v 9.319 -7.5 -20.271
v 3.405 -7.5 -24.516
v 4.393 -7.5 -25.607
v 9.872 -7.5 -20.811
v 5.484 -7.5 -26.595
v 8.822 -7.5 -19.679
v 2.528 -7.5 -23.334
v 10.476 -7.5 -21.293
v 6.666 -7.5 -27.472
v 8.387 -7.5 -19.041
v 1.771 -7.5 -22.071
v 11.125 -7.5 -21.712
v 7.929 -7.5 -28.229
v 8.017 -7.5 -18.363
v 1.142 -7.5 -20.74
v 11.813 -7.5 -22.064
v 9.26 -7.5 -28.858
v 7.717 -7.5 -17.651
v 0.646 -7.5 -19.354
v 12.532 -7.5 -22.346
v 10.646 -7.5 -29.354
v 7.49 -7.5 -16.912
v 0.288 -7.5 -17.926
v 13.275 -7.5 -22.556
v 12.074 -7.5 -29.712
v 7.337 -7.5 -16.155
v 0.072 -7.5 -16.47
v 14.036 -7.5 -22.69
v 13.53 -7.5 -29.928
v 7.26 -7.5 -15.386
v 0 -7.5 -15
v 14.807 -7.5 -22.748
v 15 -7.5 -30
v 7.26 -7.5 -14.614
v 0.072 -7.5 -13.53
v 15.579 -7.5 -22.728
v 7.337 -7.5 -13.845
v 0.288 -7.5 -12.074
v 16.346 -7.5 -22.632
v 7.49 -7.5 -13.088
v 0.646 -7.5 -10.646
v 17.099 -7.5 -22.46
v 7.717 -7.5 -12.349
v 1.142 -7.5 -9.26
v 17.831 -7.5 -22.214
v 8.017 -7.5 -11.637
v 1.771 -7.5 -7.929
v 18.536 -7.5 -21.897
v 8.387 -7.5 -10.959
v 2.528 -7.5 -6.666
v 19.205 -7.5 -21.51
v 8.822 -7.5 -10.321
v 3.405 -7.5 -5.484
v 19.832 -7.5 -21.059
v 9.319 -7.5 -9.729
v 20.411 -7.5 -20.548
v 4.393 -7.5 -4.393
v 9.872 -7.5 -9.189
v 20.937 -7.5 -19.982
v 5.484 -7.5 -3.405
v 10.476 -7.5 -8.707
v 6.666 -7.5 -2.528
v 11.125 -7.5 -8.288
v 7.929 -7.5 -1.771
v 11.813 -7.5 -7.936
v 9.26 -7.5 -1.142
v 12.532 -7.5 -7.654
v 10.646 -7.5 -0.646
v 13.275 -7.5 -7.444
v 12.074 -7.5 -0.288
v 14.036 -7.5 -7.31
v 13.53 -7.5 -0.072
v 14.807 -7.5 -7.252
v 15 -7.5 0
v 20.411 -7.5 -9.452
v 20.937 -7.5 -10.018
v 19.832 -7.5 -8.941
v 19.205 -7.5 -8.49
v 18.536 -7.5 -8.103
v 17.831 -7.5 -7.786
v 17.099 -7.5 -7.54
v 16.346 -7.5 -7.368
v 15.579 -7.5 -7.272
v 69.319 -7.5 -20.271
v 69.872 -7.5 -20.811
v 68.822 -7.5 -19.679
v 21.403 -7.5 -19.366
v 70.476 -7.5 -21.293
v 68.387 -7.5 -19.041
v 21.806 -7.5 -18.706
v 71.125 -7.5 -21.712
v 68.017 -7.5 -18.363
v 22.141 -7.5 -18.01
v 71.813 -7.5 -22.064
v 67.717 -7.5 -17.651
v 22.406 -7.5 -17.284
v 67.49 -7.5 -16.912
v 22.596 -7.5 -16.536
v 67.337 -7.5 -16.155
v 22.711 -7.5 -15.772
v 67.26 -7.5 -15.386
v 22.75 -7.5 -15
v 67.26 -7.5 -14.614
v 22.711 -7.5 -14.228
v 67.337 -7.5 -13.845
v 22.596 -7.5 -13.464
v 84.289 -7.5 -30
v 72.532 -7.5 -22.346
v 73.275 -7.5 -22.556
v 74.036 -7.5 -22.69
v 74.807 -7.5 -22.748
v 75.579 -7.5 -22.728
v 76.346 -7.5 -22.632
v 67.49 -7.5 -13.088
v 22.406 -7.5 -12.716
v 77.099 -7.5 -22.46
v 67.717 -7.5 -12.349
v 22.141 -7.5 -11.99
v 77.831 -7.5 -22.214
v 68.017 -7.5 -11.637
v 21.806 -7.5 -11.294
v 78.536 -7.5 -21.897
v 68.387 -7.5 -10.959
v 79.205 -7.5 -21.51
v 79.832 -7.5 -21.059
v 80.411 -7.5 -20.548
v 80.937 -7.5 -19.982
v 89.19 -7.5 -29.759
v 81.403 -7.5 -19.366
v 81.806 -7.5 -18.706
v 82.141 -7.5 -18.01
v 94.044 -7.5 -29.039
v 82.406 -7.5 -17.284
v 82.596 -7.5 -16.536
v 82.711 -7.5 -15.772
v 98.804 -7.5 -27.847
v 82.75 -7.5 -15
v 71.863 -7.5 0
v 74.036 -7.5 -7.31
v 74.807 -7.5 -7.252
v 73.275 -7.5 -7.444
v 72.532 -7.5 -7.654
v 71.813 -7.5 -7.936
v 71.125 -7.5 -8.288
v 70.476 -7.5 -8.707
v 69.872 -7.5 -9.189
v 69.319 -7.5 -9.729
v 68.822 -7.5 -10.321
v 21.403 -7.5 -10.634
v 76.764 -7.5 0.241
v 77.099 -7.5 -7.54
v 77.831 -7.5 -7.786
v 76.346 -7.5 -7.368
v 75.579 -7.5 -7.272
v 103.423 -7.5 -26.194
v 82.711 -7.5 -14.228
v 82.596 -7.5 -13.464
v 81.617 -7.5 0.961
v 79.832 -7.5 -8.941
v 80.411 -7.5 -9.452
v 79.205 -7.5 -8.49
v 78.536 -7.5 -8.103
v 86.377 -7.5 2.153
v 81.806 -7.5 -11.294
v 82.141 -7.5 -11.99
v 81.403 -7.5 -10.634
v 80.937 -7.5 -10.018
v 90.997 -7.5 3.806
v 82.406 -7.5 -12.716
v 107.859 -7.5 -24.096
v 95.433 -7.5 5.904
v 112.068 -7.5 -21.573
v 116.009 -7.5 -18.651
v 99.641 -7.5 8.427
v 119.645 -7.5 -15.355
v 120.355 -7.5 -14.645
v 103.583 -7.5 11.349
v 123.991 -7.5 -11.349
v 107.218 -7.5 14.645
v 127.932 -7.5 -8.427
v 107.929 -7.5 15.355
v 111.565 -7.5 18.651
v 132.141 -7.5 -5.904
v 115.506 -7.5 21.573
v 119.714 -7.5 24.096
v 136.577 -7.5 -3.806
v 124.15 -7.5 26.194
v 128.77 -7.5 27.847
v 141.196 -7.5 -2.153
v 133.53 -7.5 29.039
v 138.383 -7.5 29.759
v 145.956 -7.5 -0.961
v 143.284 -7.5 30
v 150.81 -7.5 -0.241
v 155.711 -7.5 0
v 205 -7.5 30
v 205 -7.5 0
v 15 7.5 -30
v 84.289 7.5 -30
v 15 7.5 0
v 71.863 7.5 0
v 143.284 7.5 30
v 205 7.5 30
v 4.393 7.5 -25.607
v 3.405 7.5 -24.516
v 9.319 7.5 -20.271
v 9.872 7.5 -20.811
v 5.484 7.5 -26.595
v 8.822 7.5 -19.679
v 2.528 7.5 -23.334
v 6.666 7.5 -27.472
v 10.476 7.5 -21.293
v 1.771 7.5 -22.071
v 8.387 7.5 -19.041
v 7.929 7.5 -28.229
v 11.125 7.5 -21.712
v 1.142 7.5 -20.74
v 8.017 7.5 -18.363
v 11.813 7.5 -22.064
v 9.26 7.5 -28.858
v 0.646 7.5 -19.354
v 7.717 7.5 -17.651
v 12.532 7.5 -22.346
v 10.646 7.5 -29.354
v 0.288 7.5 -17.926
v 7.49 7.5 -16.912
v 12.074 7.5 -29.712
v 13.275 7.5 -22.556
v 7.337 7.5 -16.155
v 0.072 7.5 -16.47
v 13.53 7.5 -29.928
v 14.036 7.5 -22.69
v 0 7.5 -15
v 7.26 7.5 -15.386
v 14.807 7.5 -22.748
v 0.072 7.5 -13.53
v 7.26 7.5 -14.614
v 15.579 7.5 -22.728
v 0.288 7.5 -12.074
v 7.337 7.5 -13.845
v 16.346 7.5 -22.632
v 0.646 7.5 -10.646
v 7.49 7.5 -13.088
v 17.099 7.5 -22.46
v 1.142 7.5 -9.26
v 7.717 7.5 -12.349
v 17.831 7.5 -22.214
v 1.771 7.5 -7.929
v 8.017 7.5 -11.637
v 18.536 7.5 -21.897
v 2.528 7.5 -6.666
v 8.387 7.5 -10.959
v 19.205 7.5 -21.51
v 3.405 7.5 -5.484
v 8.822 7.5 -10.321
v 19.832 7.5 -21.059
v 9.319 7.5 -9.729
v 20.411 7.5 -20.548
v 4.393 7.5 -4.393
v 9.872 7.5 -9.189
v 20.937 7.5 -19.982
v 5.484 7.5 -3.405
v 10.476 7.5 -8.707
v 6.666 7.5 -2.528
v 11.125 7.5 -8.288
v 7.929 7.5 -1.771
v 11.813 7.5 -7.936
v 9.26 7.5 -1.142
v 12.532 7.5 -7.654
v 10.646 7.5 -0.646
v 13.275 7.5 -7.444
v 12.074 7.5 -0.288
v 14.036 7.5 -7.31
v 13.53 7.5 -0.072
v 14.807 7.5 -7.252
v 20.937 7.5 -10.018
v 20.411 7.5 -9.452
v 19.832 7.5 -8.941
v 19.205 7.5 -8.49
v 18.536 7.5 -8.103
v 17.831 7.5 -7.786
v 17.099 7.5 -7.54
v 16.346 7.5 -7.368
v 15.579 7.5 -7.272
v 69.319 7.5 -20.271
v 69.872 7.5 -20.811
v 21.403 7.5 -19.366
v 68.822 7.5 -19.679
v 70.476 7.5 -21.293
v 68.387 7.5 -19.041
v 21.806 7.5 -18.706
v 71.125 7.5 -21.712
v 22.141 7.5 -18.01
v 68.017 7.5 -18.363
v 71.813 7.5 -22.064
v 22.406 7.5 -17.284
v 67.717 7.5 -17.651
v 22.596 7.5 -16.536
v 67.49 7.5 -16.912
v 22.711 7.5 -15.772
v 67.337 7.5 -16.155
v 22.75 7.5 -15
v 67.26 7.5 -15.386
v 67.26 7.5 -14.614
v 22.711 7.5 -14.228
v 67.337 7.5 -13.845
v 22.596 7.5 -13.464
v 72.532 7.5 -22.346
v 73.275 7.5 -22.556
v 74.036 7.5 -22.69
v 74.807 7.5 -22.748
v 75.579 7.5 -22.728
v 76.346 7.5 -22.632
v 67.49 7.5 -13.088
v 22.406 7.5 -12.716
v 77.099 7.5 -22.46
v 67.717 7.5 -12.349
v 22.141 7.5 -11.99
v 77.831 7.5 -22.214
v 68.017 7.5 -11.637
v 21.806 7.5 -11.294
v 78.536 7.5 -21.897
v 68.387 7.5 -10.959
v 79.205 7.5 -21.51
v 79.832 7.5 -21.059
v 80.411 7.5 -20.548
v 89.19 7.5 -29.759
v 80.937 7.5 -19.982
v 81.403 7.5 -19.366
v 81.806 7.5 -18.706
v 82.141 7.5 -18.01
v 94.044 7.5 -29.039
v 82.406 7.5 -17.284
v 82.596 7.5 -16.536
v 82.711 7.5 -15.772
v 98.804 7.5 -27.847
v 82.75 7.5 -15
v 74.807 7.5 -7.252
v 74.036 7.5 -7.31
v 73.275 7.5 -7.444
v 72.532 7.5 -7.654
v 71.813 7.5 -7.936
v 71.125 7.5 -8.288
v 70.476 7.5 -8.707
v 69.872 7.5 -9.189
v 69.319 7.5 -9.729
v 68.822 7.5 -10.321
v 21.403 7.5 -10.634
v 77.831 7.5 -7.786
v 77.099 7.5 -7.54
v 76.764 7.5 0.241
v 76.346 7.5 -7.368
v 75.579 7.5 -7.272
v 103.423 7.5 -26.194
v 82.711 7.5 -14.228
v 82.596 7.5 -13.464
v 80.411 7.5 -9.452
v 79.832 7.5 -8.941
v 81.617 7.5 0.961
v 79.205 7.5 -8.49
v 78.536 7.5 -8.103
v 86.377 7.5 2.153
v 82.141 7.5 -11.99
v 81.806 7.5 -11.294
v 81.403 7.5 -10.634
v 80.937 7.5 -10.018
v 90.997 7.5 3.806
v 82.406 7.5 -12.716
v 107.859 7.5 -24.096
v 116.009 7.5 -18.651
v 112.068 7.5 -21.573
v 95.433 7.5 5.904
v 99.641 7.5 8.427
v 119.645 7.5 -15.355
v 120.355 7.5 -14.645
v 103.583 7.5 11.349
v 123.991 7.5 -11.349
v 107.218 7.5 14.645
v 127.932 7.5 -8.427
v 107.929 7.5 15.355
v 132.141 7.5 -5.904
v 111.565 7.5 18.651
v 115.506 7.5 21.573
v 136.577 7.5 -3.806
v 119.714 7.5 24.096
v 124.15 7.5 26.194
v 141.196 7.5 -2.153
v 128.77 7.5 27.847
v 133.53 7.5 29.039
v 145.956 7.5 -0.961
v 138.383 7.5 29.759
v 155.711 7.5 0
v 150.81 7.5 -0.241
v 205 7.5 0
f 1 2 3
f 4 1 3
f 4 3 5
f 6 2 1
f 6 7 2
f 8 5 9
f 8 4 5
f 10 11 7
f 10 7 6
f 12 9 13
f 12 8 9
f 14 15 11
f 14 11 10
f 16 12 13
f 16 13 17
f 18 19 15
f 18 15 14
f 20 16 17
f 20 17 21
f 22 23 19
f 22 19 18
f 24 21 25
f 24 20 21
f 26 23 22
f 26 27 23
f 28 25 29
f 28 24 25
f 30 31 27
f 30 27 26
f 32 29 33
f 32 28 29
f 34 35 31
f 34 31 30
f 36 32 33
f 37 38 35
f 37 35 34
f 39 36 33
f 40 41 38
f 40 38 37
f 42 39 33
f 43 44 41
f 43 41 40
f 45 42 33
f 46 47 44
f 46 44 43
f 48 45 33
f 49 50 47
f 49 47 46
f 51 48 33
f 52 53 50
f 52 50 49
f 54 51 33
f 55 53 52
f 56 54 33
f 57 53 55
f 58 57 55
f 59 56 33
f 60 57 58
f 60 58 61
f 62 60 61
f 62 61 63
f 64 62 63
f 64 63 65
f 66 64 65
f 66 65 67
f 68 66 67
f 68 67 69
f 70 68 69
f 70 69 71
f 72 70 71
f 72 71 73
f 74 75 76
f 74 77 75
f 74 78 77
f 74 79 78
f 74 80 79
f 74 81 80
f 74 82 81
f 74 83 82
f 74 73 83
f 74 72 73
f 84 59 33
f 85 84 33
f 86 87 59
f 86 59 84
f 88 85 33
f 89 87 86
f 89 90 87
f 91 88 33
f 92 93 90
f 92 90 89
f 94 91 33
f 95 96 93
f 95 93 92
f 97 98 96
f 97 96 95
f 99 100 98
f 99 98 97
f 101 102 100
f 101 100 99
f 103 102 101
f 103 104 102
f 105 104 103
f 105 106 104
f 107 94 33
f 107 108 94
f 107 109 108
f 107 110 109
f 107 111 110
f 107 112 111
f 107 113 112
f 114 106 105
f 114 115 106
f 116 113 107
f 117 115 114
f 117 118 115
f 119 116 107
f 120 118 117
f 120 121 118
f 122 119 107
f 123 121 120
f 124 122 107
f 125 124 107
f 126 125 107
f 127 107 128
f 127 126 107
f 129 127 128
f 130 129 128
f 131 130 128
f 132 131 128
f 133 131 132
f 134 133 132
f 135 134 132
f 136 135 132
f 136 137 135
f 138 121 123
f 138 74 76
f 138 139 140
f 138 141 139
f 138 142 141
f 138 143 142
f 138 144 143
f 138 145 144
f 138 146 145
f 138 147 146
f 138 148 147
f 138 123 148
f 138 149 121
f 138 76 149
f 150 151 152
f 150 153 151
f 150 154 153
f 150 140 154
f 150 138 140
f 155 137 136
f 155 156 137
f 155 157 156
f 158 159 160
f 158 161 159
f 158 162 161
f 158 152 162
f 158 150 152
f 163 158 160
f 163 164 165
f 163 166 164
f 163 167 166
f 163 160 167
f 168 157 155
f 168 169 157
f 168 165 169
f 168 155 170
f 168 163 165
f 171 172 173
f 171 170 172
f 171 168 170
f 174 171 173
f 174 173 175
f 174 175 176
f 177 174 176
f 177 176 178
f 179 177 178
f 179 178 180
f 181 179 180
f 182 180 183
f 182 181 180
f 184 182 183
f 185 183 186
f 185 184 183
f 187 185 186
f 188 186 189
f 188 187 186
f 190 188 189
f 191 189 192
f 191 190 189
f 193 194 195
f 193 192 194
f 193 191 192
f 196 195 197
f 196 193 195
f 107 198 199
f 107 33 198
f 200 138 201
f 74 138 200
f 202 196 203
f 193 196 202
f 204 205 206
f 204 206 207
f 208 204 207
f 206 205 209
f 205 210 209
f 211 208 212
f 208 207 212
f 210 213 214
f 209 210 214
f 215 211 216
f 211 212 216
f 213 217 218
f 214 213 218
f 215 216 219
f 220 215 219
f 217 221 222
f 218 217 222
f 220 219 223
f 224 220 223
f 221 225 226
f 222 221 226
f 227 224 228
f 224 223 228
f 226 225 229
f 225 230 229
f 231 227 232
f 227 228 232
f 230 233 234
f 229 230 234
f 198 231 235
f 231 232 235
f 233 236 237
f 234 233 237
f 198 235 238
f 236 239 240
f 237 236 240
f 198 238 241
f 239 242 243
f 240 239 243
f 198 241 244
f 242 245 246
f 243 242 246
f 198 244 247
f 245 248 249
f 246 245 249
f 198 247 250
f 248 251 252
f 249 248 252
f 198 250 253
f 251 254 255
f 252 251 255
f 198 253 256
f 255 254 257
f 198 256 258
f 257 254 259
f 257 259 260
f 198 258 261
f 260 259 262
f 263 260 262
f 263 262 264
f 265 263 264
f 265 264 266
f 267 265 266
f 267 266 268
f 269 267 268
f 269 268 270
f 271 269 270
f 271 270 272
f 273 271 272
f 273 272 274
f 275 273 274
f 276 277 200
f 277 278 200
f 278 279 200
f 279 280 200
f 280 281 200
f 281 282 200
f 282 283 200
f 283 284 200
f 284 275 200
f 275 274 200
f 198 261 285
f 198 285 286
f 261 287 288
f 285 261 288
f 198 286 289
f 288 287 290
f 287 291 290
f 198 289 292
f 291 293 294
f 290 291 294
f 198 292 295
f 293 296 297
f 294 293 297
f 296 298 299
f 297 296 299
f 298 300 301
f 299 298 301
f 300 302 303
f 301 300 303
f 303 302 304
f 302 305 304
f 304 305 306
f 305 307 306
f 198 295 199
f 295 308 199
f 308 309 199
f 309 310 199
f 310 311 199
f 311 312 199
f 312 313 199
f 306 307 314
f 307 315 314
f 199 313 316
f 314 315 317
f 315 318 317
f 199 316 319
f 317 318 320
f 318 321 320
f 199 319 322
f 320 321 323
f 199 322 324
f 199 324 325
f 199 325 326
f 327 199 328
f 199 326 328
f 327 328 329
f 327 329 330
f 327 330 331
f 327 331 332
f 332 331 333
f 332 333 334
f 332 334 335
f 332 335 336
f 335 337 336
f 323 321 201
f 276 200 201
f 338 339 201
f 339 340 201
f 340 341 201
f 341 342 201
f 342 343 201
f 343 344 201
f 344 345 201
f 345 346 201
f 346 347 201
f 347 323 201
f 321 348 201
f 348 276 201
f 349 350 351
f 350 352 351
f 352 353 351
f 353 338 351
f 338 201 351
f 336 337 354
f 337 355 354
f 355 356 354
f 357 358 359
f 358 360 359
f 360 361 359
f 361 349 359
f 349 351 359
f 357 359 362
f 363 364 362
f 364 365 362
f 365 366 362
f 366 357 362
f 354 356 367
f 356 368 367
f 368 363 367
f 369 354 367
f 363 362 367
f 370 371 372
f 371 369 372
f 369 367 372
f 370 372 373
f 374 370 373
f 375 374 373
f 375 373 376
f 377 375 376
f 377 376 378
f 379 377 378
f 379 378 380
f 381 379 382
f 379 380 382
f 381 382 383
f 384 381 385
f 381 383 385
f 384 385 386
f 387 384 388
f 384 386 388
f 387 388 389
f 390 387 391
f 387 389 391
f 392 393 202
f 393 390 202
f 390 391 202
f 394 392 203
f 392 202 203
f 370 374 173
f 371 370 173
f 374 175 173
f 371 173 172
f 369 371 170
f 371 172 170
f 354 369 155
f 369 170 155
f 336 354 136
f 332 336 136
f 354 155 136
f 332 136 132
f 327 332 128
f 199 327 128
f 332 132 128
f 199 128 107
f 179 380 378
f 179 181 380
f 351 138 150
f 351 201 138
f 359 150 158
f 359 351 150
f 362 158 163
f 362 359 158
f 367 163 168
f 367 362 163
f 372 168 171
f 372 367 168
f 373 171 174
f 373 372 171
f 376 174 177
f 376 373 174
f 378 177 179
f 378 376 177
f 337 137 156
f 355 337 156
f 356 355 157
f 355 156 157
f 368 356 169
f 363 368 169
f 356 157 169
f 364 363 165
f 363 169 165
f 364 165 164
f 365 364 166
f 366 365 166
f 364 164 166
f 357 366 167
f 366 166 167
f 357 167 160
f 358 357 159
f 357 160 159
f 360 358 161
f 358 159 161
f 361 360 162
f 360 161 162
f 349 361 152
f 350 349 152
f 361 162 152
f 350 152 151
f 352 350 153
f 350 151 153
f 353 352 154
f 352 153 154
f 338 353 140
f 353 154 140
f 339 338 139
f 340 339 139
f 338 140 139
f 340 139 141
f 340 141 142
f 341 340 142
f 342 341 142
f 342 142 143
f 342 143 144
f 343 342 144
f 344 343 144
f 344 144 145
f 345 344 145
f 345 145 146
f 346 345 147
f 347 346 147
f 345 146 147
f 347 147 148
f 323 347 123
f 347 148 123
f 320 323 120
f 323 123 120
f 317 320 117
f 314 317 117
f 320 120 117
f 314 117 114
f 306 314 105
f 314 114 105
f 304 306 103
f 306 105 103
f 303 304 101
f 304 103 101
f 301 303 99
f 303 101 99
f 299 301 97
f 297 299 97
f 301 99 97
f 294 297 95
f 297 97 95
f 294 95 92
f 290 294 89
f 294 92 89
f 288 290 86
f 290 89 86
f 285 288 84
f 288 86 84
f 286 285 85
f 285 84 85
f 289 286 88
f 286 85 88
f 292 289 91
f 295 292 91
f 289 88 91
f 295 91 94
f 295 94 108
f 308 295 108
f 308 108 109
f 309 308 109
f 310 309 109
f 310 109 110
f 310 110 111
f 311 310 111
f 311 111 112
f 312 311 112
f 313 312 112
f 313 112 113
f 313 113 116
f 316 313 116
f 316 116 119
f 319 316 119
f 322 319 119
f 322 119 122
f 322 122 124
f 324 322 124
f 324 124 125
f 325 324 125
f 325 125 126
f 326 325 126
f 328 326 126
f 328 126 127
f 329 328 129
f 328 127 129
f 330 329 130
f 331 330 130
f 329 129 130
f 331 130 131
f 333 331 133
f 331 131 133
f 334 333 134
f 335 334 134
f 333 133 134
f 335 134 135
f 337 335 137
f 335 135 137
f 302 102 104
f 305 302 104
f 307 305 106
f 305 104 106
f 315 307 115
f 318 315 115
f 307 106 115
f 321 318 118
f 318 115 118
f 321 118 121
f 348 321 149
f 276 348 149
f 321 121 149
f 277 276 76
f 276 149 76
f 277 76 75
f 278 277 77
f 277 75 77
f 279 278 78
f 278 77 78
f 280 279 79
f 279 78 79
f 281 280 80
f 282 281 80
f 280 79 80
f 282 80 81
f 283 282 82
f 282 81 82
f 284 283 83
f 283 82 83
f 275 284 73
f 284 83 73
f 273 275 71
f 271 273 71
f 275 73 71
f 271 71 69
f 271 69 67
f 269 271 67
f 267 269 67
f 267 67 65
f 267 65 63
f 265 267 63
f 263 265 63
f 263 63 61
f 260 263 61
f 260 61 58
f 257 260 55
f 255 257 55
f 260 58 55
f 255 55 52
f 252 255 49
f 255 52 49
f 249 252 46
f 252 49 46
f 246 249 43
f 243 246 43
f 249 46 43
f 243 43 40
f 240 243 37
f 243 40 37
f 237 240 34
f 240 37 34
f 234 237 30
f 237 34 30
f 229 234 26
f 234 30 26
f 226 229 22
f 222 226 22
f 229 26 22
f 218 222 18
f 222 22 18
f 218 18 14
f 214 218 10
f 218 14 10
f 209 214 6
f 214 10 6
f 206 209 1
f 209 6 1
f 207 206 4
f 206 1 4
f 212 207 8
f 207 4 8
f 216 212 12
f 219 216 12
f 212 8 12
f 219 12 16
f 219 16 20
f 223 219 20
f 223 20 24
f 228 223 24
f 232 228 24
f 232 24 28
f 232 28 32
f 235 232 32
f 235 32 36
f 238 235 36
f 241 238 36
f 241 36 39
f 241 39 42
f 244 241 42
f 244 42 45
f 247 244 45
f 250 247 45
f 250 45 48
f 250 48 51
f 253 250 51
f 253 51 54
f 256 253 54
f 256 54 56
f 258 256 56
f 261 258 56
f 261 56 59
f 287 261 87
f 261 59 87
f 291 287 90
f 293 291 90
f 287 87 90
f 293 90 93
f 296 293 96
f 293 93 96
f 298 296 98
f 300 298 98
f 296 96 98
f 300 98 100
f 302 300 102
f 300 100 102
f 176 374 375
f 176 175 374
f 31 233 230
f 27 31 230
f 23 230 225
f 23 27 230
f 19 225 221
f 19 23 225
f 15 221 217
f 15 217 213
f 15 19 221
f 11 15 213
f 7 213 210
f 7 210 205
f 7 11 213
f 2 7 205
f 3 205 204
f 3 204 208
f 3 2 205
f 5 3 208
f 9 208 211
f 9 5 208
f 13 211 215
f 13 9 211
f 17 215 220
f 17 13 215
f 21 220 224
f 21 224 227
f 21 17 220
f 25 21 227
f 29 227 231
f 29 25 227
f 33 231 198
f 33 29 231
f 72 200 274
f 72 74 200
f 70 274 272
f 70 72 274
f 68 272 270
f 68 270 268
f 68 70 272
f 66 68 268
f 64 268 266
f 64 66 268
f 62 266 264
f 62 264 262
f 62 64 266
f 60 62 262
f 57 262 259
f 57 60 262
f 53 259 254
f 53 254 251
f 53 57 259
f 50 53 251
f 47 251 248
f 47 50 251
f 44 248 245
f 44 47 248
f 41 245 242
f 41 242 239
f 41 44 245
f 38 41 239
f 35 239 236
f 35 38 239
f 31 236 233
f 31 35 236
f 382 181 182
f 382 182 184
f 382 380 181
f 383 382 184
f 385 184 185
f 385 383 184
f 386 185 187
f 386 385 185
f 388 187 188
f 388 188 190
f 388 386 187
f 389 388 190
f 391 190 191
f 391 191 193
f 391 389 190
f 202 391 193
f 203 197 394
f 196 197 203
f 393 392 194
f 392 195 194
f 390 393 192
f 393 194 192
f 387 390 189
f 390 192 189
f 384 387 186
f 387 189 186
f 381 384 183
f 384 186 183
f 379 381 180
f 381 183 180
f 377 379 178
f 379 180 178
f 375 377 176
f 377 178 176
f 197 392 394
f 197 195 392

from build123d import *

# Parameters (mm, degrees)
F1_DEPTH = 7.5
F2_R     = 50
F3_R     = 14.99999
F4_R     = 7.75
F5_DEPTH = 15


# Not quite as in the source:
# - a fillet or chamfer is up to 0.001 mm smaller than in the source, because OpenCascade refuses the exact size


with BuildPart() as f1:
    # F0 (on Front) → F1 (new body, symmetric)
    with BuildSketch(Plane.XZ):
        Polygon((92.5735931288, 0), (0, 0), (0, -30), (105, -30), (135, 0), (205, 0), (205, 30), (122.5735931288, 30), align=None)
    extrude(amount=F1_DEPTH, both=True)

    # F2
    f2_edges = [f1.edges().sort_by_distance(p)[0] for p in [
        (92.573593, 0, 0),
        (122.573593, 0, 30),
        (105, 0, -30),
        (135, 0, 0),
    ]]
    fillet(f2_edges, radius=F2_R)

    # F3 (radius 15 in the source; OpenCascade refuses exactly that, so slightly less here)
    f3_edges = [f1.edges().sort_by_distance(p)[0] for p in [
        (0, 0, 0),
        (0, 0, -30),
    ]]
    fillet(f3_edges, radius=F3_R)

    # F4 (on face) → F5 (cut, through all)
    with BuildSketch(Plane.XZ.offset(7.5)):
        with Locations((15, -15)):
            Circle(F4_R)
        with Locations((75, -15)):
            Circle(F4_R)
    extrude(amount=-F5_DEPTH, mode=Mode.SUBTRACT)


solid = f1.part
